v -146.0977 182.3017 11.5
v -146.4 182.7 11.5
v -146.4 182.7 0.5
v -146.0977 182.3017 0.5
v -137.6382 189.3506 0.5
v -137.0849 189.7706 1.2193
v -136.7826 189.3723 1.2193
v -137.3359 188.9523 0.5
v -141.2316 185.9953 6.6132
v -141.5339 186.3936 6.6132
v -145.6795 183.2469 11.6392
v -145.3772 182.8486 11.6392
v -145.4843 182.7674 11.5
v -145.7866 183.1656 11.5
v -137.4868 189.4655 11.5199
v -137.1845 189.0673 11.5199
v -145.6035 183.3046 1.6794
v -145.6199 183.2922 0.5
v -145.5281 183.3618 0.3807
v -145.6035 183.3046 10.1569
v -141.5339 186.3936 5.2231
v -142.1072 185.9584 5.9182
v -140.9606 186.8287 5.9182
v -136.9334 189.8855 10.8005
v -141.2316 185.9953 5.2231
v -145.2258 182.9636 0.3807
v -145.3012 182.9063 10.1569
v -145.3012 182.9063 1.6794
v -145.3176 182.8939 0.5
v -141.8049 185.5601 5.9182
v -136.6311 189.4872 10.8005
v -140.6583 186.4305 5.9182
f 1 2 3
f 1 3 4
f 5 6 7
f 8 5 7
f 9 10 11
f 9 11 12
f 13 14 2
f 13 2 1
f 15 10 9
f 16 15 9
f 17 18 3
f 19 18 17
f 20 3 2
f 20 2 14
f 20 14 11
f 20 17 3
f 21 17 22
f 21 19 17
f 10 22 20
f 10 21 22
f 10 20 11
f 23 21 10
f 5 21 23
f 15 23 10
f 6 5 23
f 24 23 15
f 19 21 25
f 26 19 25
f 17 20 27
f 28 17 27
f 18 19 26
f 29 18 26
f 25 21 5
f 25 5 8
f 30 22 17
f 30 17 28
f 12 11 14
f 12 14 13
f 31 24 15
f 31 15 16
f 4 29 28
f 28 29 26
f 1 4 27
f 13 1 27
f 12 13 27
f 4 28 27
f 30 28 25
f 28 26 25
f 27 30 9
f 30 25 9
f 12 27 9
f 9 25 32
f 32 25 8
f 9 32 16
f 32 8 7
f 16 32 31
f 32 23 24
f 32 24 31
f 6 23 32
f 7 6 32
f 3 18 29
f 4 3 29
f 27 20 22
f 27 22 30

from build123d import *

# Parameters (mm, degrees)
BOX250_W                  = 0.5
BOX250_H                  = 1
BOX250_DEPTH              = 15
BOX250_ROLL_ANGLE         = 46
BOX251_W                  = 0.5
BOX251_H                  = 1
BOX251_DEPTH              = 15
BOX251_ROLL_ANGLE         = -46
BOX249_W                  = 0.5
BOX249_H                  = 1
BOX249_DEPTH              = 11
FUSION026_PLACEMENT_ANGLE = -52.8


with BuildPart() as cubo250:
    # Box250 → Box250 (new body)
    with BuildSketch(Plane.XY):
        with Locations((0.25, 0.5)):
            Rectangle(BOX250_W, BOX250_H)
    extrude(amount=BOX250_DEPTH)


with BuildPart() as cubo250_1:
    # Box250 roll: moved
    add(cubo250.part.rotate(Axis((0, 0, 0), (1, 0, 0)), BOX250_ROLL_ANGLE))


with BuildPart() as cubo250_2:
    # Box250 placement: moved
    add(cubo250_1.part.moved(Location((0, 11, 0.5))))


with BuildPart() as cubo251:
    # Box251 → Box251 (new body)
    with BuildSketch(Plane.XY):
        with Locations((0.25, 0.5)):
            Rectangle(BOX251_W, BOX251_H)
    extrude(amount=BOX251_DEPTH)


with BuildPart() as cubo251_1:
    # Box251 roll: moved
    add(cubo251.part.rotate(Axis((0, 0, 0), (1, 0, 0)), BOX251_ROLL_ANGLE))


with BuildPart() as cubo251_2:
    # Box251 placement: moved
    add(cubo251_1.part.moved(Location((0, 0.4, 1.1))))


with BuildPart() as fusion026:
    # Box249 → Box249 (new body)
    with BuildSketch(Plane.XY.offset(0.5)):
        with Locations((0.25, 0.5)):
            Rectangle(BOX249_W, BOX249_H)
    extrude(amount=BOX249_DEPTH)

    # Fusion026: union Cubo250, Cubo251
    add(cubo250_2.part)
    add(cubo251_2.part)


with BuildPart() as fusion026_1:
    # Fusion026 placement: moved
    add(fusion026.part.moved(Location((-146.4, 182.7, 0))).rotate(Axis((-146.4, 182.7, 0), (0, 0, 1)), FUSION026_PLACEMENT_ANGLE))


solid = fusion026_1.part
